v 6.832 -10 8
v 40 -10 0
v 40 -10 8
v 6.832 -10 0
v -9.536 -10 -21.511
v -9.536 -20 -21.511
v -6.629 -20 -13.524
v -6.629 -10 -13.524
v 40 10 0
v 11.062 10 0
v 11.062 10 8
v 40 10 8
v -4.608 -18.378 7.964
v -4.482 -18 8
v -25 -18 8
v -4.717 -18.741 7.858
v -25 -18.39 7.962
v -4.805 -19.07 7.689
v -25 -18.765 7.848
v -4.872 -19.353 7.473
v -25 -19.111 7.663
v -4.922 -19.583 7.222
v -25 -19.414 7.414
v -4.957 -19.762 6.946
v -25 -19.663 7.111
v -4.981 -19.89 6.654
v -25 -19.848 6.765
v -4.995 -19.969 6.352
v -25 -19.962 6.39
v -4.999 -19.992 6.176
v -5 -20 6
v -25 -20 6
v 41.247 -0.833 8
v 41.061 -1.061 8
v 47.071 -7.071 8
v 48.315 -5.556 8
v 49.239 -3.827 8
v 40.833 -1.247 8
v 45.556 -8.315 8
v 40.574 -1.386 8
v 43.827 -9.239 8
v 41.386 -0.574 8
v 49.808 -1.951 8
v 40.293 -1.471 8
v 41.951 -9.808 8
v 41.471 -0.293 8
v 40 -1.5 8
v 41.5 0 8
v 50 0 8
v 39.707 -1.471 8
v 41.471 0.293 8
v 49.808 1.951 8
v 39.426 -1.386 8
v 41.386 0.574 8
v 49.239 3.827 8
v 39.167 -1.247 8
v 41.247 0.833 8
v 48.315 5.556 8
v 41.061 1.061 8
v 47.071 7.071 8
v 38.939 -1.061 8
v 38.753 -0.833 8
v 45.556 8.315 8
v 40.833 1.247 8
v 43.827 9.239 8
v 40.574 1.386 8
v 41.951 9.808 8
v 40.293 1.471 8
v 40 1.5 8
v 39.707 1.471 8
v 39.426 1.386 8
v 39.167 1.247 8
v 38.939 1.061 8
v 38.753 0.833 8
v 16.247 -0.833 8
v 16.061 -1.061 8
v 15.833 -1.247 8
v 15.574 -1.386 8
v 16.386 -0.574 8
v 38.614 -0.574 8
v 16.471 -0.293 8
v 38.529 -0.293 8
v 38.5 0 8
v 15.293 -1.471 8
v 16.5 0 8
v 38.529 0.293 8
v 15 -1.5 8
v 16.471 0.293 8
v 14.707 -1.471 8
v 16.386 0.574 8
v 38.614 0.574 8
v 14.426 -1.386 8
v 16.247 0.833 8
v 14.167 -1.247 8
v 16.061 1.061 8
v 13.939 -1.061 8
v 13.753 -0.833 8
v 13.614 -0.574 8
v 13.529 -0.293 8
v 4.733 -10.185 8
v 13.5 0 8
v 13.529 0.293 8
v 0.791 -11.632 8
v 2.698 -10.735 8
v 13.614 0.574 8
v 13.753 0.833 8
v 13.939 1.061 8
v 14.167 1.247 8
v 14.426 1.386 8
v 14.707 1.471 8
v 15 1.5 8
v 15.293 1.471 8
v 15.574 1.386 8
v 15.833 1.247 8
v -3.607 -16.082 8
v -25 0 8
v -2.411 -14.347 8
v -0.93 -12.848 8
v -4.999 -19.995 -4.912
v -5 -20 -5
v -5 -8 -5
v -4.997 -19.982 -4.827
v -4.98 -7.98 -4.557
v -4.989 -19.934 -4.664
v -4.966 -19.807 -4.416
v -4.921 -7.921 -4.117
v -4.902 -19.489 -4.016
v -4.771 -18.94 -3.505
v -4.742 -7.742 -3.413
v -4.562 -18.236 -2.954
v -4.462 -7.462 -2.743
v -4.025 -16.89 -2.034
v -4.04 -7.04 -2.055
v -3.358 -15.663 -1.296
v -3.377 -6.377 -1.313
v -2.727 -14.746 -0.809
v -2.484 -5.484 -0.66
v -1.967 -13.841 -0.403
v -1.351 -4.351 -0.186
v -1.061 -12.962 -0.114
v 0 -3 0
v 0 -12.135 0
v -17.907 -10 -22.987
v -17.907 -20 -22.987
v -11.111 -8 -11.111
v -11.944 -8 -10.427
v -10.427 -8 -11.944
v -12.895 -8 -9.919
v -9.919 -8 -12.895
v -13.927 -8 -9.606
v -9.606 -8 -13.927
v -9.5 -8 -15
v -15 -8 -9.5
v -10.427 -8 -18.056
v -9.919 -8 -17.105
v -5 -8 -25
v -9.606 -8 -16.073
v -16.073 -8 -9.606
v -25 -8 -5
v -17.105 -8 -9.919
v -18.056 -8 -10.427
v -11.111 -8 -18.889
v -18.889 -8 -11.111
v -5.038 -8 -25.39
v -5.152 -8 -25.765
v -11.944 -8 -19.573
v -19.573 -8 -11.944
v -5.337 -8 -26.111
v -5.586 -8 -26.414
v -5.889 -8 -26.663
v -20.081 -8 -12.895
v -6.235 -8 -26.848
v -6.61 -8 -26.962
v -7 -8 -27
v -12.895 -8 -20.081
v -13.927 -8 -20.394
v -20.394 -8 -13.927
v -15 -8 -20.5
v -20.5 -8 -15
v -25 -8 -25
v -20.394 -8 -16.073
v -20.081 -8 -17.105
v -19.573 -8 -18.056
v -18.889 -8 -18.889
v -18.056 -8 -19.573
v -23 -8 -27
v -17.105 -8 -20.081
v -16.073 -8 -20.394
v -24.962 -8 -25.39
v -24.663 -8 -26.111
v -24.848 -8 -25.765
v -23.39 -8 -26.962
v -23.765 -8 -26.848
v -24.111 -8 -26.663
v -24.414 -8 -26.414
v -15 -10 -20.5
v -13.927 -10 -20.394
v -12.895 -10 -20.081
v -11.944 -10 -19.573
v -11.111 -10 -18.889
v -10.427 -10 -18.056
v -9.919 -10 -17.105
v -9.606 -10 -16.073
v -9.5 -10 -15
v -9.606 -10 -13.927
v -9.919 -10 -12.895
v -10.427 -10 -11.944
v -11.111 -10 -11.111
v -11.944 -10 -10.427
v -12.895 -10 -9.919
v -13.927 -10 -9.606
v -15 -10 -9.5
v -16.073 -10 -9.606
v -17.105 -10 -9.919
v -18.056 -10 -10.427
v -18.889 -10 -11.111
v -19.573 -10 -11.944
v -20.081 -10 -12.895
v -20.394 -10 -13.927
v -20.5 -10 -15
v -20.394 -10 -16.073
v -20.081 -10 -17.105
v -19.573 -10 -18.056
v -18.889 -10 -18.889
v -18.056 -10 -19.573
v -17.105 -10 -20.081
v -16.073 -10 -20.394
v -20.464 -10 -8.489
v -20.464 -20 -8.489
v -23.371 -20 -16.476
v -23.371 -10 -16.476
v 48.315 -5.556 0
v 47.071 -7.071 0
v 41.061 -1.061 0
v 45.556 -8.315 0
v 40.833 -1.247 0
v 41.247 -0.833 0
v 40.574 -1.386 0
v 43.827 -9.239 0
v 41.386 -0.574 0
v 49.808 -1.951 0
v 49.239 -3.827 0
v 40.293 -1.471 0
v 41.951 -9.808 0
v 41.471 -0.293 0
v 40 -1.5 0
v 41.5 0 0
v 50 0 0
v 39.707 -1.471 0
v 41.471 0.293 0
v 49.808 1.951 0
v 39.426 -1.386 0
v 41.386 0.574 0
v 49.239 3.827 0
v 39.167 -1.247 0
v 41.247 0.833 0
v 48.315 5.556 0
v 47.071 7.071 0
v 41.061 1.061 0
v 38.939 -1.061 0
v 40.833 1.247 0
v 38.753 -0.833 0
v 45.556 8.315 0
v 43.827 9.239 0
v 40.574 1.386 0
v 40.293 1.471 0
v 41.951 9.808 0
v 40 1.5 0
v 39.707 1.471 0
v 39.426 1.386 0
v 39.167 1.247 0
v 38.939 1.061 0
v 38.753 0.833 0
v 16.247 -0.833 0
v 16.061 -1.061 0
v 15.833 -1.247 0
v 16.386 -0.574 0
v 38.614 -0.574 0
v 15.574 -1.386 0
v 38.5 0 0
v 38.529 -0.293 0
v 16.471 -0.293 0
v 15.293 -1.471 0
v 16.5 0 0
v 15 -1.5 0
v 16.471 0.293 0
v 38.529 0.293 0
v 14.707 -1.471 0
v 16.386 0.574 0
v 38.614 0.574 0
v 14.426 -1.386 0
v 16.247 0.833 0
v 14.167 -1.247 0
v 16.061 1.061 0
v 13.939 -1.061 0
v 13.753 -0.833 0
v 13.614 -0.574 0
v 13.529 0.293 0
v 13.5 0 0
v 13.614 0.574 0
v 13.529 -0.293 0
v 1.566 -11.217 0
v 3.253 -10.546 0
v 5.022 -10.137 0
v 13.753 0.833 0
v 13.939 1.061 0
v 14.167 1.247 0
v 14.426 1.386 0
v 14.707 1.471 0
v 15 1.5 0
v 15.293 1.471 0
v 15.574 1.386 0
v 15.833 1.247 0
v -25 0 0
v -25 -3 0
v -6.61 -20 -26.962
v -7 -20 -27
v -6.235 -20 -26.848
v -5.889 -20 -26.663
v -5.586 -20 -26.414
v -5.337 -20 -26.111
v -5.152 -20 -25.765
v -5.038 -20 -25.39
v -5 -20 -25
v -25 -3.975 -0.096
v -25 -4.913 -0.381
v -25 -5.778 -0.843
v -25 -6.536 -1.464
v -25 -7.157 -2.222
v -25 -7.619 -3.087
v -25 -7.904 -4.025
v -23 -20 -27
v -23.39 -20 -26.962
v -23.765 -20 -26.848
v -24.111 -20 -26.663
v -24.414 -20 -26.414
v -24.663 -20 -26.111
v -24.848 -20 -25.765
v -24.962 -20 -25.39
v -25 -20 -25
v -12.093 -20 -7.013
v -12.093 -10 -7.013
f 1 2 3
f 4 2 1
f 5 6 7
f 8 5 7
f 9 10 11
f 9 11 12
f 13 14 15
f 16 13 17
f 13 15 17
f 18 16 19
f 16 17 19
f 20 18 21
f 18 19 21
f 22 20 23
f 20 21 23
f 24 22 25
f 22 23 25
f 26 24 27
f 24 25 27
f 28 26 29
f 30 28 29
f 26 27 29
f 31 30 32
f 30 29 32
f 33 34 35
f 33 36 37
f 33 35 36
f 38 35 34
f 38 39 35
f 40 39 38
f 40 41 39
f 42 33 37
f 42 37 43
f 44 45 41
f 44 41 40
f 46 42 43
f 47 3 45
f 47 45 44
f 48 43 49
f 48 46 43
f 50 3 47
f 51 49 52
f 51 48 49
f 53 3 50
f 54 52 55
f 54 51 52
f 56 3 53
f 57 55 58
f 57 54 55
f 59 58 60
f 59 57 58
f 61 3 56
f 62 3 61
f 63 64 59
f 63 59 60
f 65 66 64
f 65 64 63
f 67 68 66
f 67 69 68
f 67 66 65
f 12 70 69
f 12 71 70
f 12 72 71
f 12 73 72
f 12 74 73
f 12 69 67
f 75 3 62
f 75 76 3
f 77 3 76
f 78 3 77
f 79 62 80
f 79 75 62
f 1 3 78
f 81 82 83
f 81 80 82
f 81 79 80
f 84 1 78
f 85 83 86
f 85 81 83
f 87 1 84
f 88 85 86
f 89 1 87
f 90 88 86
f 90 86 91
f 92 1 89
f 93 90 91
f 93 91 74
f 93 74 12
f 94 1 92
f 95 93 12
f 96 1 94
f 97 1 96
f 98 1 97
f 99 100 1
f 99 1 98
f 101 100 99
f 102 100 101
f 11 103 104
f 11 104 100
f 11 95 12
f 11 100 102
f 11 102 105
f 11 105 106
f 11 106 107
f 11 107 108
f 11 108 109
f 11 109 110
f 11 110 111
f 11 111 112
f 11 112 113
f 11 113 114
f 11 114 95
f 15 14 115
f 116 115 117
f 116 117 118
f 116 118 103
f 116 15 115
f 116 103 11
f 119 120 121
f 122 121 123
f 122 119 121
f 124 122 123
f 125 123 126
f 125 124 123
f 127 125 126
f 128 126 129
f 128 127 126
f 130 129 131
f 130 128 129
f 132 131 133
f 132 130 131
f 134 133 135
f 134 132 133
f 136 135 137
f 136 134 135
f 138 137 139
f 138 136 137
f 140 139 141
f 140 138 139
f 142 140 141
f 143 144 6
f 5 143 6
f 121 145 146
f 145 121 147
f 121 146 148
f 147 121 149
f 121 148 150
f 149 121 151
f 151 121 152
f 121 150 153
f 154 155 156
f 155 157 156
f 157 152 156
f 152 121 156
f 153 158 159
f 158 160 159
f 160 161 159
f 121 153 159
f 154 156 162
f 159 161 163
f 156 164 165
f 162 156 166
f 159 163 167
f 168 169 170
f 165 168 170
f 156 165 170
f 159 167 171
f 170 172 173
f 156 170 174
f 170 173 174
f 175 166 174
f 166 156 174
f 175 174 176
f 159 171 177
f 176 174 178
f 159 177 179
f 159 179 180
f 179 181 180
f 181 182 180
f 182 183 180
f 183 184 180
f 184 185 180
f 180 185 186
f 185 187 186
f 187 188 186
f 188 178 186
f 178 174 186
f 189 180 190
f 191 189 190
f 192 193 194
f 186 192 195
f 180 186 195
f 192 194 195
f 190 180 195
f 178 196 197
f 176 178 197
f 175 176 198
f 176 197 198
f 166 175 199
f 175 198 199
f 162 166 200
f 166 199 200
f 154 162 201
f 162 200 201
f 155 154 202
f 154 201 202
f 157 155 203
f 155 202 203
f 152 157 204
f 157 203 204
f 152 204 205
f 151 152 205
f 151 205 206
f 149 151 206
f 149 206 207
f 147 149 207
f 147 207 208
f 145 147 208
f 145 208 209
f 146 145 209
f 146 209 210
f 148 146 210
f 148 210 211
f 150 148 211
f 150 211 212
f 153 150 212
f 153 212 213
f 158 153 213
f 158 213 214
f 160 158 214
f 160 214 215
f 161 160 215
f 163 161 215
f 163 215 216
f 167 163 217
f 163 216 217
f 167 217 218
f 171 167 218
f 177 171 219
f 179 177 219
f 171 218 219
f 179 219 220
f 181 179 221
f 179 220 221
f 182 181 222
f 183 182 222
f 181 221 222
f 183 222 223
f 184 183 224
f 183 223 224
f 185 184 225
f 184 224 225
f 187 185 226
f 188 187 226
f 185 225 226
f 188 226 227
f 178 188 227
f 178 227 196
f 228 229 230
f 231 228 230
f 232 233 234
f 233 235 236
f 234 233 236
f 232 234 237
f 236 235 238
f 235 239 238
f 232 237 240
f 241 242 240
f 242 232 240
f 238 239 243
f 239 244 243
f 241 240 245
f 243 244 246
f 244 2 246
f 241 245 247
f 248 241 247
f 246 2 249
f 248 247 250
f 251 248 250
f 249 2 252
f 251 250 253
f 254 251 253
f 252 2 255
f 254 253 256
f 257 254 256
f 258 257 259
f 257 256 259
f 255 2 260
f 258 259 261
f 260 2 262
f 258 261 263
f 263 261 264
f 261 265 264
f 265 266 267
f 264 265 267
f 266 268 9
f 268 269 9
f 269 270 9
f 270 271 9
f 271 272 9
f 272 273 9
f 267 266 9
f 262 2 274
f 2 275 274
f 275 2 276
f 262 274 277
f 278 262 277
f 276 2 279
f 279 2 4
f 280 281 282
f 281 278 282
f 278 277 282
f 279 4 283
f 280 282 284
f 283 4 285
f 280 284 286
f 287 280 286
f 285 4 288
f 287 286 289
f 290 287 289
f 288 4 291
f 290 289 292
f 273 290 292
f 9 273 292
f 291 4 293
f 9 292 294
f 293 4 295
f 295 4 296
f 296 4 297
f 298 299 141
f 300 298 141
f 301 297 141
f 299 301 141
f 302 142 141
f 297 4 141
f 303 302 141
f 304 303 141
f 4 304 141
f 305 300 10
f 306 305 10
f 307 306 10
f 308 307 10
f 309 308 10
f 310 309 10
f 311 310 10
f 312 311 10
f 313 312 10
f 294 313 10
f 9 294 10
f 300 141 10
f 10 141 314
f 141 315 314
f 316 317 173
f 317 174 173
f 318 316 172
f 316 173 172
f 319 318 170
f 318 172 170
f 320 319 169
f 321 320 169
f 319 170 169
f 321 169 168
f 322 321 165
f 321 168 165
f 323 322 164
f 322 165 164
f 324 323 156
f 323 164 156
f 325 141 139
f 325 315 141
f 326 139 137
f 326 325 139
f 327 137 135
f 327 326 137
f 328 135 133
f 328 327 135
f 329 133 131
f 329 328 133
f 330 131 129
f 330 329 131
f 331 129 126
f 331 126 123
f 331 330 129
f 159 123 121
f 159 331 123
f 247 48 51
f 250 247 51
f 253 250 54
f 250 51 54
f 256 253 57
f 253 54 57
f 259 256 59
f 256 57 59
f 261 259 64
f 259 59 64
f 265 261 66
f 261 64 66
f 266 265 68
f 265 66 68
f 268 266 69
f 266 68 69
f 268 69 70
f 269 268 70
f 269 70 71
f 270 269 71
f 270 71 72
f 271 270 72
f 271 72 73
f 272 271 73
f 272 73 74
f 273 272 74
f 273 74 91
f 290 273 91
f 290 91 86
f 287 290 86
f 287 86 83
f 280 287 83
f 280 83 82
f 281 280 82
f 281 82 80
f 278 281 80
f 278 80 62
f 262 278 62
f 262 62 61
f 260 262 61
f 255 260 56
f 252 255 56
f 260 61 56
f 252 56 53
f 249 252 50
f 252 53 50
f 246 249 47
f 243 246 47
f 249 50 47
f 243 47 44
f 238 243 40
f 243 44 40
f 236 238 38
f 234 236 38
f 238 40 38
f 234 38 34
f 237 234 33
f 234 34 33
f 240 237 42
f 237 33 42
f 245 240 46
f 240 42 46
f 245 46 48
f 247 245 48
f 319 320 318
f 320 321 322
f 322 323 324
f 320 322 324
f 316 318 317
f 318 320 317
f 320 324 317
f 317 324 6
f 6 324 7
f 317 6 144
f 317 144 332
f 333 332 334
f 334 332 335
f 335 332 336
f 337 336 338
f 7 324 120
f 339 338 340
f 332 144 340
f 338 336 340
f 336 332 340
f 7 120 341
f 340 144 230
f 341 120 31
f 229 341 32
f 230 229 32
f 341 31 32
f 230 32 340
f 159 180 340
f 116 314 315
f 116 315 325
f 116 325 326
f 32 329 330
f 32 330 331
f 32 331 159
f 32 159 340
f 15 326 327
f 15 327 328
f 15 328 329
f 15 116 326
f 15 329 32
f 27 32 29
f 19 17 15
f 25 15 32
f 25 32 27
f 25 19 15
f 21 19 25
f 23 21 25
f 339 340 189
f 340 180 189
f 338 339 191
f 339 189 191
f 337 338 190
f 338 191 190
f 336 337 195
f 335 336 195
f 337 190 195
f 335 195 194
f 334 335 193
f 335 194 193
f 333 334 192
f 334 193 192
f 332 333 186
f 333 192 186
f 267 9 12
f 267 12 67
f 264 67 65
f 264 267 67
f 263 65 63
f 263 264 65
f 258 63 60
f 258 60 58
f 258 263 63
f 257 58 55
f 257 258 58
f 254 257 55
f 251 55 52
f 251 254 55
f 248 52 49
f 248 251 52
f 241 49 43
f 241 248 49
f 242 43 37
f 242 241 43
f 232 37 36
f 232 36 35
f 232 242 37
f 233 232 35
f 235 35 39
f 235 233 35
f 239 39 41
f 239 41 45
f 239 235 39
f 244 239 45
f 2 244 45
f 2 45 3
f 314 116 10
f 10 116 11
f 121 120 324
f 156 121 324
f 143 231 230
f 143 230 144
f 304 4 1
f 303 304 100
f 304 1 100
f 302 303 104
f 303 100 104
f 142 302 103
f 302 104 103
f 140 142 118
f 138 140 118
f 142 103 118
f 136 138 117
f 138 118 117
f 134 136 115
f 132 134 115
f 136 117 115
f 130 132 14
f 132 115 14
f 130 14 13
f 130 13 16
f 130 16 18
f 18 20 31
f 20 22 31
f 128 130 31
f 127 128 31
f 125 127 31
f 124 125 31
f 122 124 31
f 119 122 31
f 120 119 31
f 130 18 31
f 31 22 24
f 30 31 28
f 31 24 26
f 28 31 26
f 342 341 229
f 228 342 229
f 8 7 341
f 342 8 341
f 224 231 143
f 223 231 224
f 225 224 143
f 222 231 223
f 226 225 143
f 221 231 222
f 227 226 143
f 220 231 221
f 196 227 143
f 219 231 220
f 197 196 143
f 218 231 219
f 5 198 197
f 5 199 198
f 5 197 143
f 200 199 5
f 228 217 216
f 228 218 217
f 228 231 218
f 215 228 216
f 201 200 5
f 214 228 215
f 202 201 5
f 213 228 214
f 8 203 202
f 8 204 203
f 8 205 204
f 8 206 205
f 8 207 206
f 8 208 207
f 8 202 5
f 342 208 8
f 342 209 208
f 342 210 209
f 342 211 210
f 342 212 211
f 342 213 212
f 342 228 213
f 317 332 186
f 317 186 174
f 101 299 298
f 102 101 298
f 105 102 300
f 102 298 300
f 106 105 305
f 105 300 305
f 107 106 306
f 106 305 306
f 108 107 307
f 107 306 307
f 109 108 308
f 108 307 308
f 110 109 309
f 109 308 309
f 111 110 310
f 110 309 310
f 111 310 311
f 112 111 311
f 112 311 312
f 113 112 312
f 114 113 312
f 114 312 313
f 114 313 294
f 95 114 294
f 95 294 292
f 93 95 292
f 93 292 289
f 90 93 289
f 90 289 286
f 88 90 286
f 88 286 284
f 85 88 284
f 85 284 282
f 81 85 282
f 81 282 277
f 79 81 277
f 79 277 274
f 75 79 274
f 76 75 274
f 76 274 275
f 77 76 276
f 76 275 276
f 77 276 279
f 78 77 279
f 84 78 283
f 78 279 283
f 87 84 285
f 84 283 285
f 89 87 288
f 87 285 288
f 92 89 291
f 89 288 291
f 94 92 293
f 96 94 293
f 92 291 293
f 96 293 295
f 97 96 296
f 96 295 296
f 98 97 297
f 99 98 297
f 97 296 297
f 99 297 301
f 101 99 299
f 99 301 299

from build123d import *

# Parameters (mm, degrees)
BOSS_EXTRUDE1_DEPTH      = 8
SKETCH2_R                = 1.5
CUT_EXTRUDE1_DEPTH       = 10
SKETCH3_R                = 1.5
CUT_EXTRUDE2_DEPTH       = 10
BOSS_EXTRUDE3_DEPTH      = 30
BOSS_EXTRUDE3_DEPTH_BACK = 8
SKETCH6_W                = 20
SKETCH6_H                = 10
FILLET3_R                = 12
SKETCH7_W                = 20
SKETCH7_H                = 30
BOSS_EXTRUDE4_DEPTH      = 2
CUT_EXTRUDE3_DEPTH       = 10
SKETCH9_R                = 5.5
CUT_EXTRUDE4_DEPTH       = 10
FILLET4_R                = 5
FILLET5_R                = 2
CUT_EXTRUDE5_DEPTH       = 10
SKETCH11_W               = 20
SKETCH11_H               = 3
CUT_EXTRUDE6_DEPTH       = 15
FILLET6_R                = 2


with BuildPart() as part:
    # Sketch1 → Boss-Extrude1 (new body)
    with BuildSketch(Plane.XY):
        with BuildLine():
            Line((-25, 10), (40, 10))
            ThreePointArc((40, 10), (50, 0), (40, -10))
            Line((40, -10), (-25, -10))
            Line((-25, -10), (-25, 10))
        make_face()
    extrude(amount=BOSS_EXTRUDE1_DEPTH)

    # Sketch2 → Cut-Extrude1 (cut)
    with BuildSketch(Plane.XY.offset(8)):
        with Locations((40, 0)):
            Circle(SKETCH2_R)
    extrude(amount=-CUT_EXTRUDE1_DEPTH, mode=Mode.SUBTRACT)

    # Sketch3 → Cut-Extrude2 (cut)
    with BuildSketch(Plane(origin=(0, 0, 0), x_dir=(-1, 0, 0), z_dir=(0, 0, -1))):
        with Locations((-15, 0)):
            Circle(SKETCH3_R)
    extrude(amount=-CUT_EXTRUDE2_DEPTH, mode=Mode.SUBTRACT)

    # Sketch6 → Boss-Extrude3 (add, two sides: drawn at the far end of the back side and taken through both)
    with BuildSketch(Plane(origin=(0, 0, 0), x_dir=(-1, 0, 0), z_dir=(0, 0, -1)).offset(-BOSS_EXTRUDE3_DEPTH_BACK)):
        with Locations((15, -15)):
            Rectangle(SKETCH6_W, SKETCH6_H)
    extrude(amount=BOSS_EXTRUDE3_DEPTH + BOSS_EXTRUDE3_DEPTH_BACK)

    # Fillet3
    # the kernel refuses this fillet: 12 mm, written as the material it adds along each edge
    with BuildSketch(Plane(origin=(-5, -10, 8), x_dir=(0, -1, 0), z_dir=(0, 0, -1))) as fillet3_piece_1:
        with BuildLine():
            CenterArc((12, -11.832159566), FILLET3_R, 99.594068227, 80.405931773)
            Line((0, -11.832159566), (0, 0))
            Line((0, 0), (10, 0))
        make_face()
    extrude(amount=8)

    # Sketch7 → Boss-Extrude4 (add)
    with BuildSketch(Plane(origin=(0, -10, 0), x_dir=(1, 0, 0), z_dir=(0, 1, 0))):
        with Locations((-15, 15)):
            Rectangle(SKETCH7_W, SKETCH7_H)
    extrude(amount=BOSS_EXTRUDE4_DEPTH)

    # Sketch8 → Cut-Extrude3 (cut)
    with BuildSketch(Plane.XZ.offset(20)):
        Polygon((-12.092828782, -7.012612723), (-20.463694682, -8.488622233), (-23.370865901, -16.47600951), (-17.907171218, -22.987387277), (-9.536305318, -21.511377767), (-6.629134099, -13.52399049), align=None)
    extrude(amount=-CUT_EXTRUDE3_DEPTH, mode=Mode.SUBTRACT)

    # Sketch9 → Cut-Extrude4 (cut)
    with BuildSketch(Plane.XZ.offset(10)):
        with Locations(Location((-15, -15, 0), (0, 0, 270))):
            Circle(SKETCH9_R)
    extrude(amount=-CUT_EXTRUDE4_DEPTH, mode=Mode.SUBTRACT)

    # Fillet4
    # the kernel refuses this fillet: 5 mm, written as the material it adds along each edge
    with BuildSketch(Plane(origin=(-5, -20, 0), x_dir=(1, 0, 0), z_dir=(0, 1, 0))) as fillet4_piece_1_section:
        with BuildLine():
            CenterArc((FILLET4_R, FILLET4_R), FILLET4_R, 180, 90)
            Line((0, FILLET4_R), (0, 0))
            Line((0, 0), (FILLET4_R, 0))
        make_face()
    fillet4_piece_1 = extrude(amount=12, mode=Mode.PRIVATE)
    fillet4_piece_1 = fillet4_piece_1 - Plane(origin=(6.832159566, -22, 0), x_dir=(0, -1, 0), z_dir=(0, 0, 1)) * Cylinder(12, 44, mode=Mode.PRIVATE)
    add(fillet4_piece_1)
    with BuildSketch(Plane(origin=(-25, -8, 0), x_dir=(0, 1, 0), z_dir=(1, 0, 0))) as fillet4_piece_2:
        with BuildLine():
            CenterArc((FILLET4_R, -FILLET4_R), FILLET4_R, 90, 90)
            Line((0, -FILLET4_R), (0, 0))
            Line((0, 0), (FILLET4_R, 0))
        make_face()
    extrude(amount=20)
    with BuildSketch(Plane(origin=(-5, -20, 0), x_dir=(1, 0, 0), z_dir=(0, 1, 0))) as fillet4_piece_3a_section:
        with BuildLine():
            CenterArc((FILLET4_R, FILLET4_R), FILLET4_R, 180, 90)
            Line((0, FILLET4_R), (0, 0))
            Line((0, 0), (FILLET4_R, 0))
        make_face()
    fillet4_piece_3a = extrude(amount=24.5, mode=Mode.PRIVATE)
    fillet4_piece_3a = split(fillet4_piece_3a, bisect_by=Plane(origin=(-5, -8, 0), z_dir=(0, 1, 0)), keep=Keep.TOP, mode=Mode.PRIVATE)
    with BuildSketch(Plane(origin=(-25, -8, 0), x_dir=(0, 1, 0), z_dir=(1, 0, 0))) as fillet4_piece_3b_section:
        with BuildLine():
            CenterArc((FILLET4_R, -FILLET4_R), FILLET4_R, 90, 90)
            Line((0, -FILLET4_R), (0, 0))
            Line((0, 0), (FILLET4_R, 0))
        make_face()
    fillet4_piece_3b = extrude(amount=32.5, mode=Mode.PRIVATE)
    fillet4_piece_3b = split(fillet4_piece_3b, bisect_by=Plane(origin=(-5, -8, 0), z_dir=(1, 0, 0)), keep=Keep.TOP, mode=Mode.PRIVATE)
    fillet4_piece_3 = fillet4_piece_3a & fillet4_piece_3b
    add(fillet4_piece_3)

    # Fillet5
    fillet5_edges = [part.edges().sort_by_distance(p)[0] for p in [
        (-15, -20, 8),
        (-25, -14, -30),
        (-5, -14, -30),
        (-25, 10, 4),
    ]]
    fillet(fillet5_edges, radius=FILLET5_R)

    # Sketch10 → Cut-Extrude5 (cut)
    with BuildSketch(Plane.XY.offset(8)):
        with BuildLine():
            Line((-25, 0), (11.061986304, 10))
            Line((11.061986304, 10), (-23, 10))
            ThreePointArc((-23, 10), (-24.414213562, 9.414213562), (-25, 8))
            Line((-25, 8), (-25, 0))
        make_face()
    extrude(amount=-CUT_EXTRUDE5_DEPTH, mode=Mode.SUBTRACT)

    # Sketch11 → Cut-Extrude6 (cut)
    with BuildSketch(Plane.XZ.offset(20)):
        with Locations((-15, -28.5)):
            Rectangle(SKETCH11_W, SKETCH11_H)
    extrude(amount=-CUT_EXTRUDE6_DEPTH, mode=Mode.SUBTRACT)

    # Fillet6
    fillet6_edges = [part.edges().sort_by_distance(p)[0] for p in [
        (-25, -14, -27),
        (-5, -14, -27),
    ]]
    fillet(fillet6_edges, radius=FILLET6_R)


solid = part.part
